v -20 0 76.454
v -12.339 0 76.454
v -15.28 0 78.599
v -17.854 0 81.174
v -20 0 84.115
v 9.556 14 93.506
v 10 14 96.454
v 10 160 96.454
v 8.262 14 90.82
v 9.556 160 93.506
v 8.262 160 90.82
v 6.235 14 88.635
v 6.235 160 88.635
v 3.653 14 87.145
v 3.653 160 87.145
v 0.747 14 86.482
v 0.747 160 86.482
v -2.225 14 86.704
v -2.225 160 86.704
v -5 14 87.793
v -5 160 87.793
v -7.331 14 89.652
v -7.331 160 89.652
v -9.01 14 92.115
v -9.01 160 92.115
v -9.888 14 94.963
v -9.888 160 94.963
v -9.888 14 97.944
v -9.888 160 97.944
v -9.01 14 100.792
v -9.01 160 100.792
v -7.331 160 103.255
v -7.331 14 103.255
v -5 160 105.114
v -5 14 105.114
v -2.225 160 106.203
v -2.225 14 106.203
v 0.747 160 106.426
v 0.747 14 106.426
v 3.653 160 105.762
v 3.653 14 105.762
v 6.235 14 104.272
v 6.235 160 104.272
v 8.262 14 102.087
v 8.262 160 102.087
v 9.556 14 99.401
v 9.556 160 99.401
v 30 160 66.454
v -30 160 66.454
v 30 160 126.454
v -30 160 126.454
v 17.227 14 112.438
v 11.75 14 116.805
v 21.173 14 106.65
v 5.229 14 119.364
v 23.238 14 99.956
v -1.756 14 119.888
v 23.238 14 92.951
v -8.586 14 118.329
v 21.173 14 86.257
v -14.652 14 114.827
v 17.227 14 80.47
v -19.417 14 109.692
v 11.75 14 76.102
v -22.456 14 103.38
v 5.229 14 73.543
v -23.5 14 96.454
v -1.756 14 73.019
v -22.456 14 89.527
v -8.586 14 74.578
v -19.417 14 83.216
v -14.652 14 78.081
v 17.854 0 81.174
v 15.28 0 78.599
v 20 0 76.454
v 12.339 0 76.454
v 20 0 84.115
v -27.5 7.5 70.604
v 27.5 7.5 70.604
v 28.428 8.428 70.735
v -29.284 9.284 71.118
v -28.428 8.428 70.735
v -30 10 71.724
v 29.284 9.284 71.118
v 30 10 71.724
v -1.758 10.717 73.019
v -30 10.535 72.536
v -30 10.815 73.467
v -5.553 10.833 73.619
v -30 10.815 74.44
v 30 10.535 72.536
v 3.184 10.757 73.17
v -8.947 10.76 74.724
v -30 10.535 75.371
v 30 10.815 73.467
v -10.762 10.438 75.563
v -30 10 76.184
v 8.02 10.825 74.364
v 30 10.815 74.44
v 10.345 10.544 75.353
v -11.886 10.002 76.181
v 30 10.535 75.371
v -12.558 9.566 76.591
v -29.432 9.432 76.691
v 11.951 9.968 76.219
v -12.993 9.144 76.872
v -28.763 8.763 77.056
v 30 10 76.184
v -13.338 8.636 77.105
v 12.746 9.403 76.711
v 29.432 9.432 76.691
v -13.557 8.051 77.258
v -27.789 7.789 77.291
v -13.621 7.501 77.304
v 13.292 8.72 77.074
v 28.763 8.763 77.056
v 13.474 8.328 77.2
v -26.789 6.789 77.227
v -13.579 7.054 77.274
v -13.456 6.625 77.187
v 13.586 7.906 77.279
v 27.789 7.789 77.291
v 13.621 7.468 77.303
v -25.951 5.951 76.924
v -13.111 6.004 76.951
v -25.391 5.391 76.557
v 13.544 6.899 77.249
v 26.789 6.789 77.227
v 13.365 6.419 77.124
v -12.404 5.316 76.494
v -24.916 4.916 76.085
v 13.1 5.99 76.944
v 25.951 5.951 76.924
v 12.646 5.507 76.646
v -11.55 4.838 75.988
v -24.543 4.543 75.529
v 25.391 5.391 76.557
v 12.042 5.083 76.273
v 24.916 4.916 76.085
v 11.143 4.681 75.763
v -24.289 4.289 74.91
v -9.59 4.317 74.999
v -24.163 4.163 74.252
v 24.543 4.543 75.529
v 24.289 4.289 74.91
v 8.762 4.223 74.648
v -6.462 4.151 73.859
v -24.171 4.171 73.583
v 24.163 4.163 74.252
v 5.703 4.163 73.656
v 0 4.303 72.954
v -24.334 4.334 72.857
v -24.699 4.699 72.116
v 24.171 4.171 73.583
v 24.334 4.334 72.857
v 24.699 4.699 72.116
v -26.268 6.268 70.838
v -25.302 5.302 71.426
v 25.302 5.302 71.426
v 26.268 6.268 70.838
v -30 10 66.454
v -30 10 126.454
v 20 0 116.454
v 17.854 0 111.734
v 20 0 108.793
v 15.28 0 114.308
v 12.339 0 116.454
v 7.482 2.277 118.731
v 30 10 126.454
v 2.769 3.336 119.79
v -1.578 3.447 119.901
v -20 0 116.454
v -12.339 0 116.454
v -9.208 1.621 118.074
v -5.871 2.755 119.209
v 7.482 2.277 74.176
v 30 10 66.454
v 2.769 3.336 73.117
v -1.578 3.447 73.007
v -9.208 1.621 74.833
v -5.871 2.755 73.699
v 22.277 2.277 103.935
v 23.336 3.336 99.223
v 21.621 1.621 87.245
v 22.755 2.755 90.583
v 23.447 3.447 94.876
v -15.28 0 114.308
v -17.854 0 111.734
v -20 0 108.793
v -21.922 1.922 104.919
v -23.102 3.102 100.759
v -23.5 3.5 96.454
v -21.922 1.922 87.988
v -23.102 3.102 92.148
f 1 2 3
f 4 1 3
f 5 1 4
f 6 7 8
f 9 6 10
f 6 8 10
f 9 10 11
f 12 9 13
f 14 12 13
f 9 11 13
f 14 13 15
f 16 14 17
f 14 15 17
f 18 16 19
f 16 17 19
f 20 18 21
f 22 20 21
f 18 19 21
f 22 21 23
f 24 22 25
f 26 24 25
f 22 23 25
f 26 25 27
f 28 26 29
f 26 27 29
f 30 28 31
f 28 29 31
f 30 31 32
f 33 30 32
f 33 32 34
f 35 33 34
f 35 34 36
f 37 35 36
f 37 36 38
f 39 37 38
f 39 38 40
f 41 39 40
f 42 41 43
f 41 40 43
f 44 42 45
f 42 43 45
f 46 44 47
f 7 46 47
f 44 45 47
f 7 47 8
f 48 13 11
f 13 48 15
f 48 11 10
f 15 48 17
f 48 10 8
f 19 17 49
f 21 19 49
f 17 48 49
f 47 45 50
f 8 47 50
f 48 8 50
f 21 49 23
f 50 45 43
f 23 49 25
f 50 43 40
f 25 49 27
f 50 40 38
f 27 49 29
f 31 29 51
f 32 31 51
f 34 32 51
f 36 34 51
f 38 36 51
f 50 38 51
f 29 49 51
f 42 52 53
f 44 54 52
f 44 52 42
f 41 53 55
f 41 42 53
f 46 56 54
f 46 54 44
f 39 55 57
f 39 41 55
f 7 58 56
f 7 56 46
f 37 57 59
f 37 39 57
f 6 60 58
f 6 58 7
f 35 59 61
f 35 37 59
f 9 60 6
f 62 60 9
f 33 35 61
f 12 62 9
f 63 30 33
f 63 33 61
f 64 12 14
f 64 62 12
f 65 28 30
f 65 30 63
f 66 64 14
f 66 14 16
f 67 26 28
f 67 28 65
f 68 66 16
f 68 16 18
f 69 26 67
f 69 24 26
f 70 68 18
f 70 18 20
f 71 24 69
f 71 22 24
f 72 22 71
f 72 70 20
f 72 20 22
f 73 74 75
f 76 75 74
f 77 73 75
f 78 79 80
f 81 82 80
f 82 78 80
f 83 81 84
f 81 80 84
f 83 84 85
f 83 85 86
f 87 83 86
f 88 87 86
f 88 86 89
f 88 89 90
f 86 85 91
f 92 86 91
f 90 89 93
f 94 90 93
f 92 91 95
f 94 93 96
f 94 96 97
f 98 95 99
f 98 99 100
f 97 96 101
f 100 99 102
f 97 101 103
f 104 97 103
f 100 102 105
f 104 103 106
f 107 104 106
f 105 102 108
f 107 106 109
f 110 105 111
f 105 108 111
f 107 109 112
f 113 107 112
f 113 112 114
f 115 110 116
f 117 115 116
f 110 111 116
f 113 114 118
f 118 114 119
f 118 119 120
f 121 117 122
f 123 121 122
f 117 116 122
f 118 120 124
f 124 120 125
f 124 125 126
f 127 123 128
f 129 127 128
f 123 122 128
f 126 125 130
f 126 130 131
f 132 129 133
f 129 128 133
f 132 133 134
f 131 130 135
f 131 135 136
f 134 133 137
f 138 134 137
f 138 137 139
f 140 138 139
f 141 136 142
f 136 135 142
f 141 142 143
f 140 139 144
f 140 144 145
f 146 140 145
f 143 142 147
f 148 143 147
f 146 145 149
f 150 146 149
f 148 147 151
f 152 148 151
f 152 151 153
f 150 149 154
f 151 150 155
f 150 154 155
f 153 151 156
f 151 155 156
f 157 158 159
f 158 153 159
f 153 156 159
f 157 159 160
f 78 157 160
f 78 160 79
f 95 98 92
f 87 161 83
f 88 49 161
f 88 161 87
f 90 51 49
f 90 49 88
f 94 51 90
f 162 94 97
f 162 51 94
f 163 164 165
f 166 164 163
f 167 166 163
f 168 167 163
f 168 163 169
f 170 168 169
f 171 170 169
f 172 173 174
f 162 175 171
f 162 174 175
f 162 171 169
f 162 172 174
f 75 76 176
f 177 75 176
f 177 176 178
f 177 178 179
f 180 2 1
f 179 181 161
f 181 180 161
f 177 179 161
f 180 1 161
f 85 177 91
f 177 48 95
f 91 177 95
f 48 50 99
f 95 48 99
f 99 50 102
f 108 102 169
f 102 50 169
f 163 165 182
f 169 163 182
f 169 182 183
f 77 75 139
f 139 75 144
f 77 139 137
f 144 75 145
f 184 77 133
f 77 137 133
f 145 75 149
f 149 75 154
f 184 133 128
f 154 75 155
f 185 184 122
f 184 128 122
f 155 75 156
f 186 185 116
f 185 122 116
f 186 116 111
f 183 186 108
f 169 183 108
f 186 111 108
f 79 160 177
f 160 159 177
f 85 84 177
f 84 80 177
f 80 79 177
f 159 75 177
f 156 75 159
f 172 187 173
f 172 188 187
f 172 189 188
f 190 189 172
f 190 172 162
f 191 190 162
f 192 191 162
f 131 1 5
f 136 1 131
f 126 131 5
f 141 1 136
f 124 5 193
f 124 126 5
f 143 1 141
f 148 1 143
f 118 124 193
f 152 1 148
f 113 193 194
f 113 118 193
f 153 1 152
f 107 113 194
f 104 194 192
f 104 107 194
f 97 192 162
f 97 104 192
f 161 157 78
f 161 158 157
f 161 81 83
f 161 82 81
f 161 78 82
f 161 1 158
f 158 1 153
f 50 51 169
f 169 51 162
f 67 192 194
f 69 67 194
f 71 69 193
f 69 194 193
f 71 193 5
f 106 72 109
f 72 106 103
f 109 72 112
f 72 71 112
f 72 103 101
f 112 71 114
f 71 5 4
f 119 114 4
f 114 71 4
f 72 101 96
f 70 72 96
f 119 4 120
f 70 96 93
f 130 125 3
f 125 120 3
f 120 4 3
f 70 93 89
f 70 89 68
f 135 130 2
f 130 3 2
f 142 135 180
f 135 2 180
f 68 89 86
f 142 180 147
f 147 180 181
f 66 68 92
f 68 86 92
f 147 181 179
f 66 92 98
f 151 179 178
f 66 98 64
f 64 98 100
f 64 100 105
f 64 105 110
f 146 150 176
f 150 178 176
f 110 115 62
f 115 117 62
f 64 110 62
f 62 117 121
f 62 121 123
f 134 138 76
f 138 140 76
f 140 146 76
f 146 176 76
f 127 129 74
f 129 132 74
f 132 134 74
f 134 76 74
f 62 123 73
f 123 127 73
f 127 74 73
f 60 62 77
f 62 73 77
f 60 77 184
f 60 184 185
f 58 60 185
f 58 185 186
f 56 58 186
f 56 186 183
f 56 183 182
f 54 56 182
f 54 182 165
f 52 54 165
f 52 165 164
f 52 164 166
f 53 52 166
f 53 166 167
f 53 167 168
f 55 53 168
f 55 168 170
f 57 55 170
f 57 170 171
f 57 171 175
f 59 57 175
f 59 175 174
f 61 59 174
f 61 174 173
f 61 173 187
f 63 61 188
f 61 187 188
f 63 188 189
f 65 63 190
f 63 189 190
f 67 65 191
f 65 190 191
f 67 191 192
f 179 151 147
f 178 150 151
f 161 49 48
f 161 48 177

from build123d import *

# Parameters (mm, degrees)
SKETCH_1_W                = 160
SKETCH_1_H                = 60
EXTRUDE_1_DEPTH           = 60
HOLE_WIZARD_6_7_6_7_1_D   = 6.7
HOLE_WIZARD_1_D           = 20
HOLE_WIZARD_1_CBORE_D     = 47
HOLE_WIZARD_1_CBORE_DEPTH = 14
CHAMFER_1_SIZE            = 10


with BuildPart() as part:
    # Эскиз1 → Бобышка-Вытянуть1 (new body)
    with BuildSketch(Plane(origin=(-30, 0, 0), x_dir=(0, -1, 0), z_dir=(-1, 0, 0))):
        with Locations((-80, 96.453617418)):
            Rectangle(SKETCH_1_W, SKETCH_1_H)
    extrude(amount=-EXTRUDE_1_DEPTH)

    # Диаметр отверстия Ø6.7 (6.7)1 (through all)
    with Locations(Plane.ZY.offset(30)):
        with Locations((73.953617418, 7.5)):
            Hole(HOLE_WIZARD_6_7_6_7_1_D / 2)

    # Отверстие1 (through all)
    with Locations(Plane(origin=(0, 0, 0), x_dir=(-1, 0, 0), z_dir=(0, -1, 0))):
        with Locations((0, -96.453617418)):
            CounterBoreHole(HOLE_WIZARD_1_D / 2, HOLE_WIZARD_1_CBORE_D / 2, HOLE_WIZARD_1_CBORE_DEPTH)

    # Фаска1
    # the kernel refuses this chamfer: 10 mm, written as the material it takes off along each edge
    with BuildSketch(Plane(origin=(-30, 0, 40.736787538), x_dir=(0.9996219169112968, -0.027495876610586372, 0), z_dir=(0, 0, 1)), Plane(origin=(-55.71682988, 0, 126.453617418), x_dir=(0, -0.027495876610586372, -0.9996219169112968), z_dir=(1, 0, 0))) as chamfer_1_piece_1:
        Polygon((CHAMFER_1_SIZE * 0.999621916911, CHAMFER_1_SIZE * 0.0274958766106), (-CHAMFER_1_SIZE * 0.0274958766106, CHAMFER_1_SIZE * 0.999621916911), (0, 0), align=None)
    extrude(amount=111.433659759, mode=Mode.SUBTRACT)
    with BuildSketch(Plane(origin=(-55.71682988, 0, 66.453617418), x_dir=(0, -0.027495876610586372, 0.9996219169112968), z_dir=(1, 0, 0)), Plane(origin=(30, 0, 40.736787538), x_dir=(-0.9996219169112968, -0.027495876610586372, 0), z_dir=(0, 0, 1))) as chamfer_1_piece_2:
        Polygon((CHAMFER_1_SIZE * 0.999621916911, -CHAMFER_1_SIZE * 0.0274958766106), (-CHAMFER_1_SIZE * 0.0274958766106, -CHAMFER_1_SIZE * 0.999621916911), (0, 0), align=None)
    extrude(amount=111.433659759, mode=Mode.SUBTRACT)


solid = part.part
